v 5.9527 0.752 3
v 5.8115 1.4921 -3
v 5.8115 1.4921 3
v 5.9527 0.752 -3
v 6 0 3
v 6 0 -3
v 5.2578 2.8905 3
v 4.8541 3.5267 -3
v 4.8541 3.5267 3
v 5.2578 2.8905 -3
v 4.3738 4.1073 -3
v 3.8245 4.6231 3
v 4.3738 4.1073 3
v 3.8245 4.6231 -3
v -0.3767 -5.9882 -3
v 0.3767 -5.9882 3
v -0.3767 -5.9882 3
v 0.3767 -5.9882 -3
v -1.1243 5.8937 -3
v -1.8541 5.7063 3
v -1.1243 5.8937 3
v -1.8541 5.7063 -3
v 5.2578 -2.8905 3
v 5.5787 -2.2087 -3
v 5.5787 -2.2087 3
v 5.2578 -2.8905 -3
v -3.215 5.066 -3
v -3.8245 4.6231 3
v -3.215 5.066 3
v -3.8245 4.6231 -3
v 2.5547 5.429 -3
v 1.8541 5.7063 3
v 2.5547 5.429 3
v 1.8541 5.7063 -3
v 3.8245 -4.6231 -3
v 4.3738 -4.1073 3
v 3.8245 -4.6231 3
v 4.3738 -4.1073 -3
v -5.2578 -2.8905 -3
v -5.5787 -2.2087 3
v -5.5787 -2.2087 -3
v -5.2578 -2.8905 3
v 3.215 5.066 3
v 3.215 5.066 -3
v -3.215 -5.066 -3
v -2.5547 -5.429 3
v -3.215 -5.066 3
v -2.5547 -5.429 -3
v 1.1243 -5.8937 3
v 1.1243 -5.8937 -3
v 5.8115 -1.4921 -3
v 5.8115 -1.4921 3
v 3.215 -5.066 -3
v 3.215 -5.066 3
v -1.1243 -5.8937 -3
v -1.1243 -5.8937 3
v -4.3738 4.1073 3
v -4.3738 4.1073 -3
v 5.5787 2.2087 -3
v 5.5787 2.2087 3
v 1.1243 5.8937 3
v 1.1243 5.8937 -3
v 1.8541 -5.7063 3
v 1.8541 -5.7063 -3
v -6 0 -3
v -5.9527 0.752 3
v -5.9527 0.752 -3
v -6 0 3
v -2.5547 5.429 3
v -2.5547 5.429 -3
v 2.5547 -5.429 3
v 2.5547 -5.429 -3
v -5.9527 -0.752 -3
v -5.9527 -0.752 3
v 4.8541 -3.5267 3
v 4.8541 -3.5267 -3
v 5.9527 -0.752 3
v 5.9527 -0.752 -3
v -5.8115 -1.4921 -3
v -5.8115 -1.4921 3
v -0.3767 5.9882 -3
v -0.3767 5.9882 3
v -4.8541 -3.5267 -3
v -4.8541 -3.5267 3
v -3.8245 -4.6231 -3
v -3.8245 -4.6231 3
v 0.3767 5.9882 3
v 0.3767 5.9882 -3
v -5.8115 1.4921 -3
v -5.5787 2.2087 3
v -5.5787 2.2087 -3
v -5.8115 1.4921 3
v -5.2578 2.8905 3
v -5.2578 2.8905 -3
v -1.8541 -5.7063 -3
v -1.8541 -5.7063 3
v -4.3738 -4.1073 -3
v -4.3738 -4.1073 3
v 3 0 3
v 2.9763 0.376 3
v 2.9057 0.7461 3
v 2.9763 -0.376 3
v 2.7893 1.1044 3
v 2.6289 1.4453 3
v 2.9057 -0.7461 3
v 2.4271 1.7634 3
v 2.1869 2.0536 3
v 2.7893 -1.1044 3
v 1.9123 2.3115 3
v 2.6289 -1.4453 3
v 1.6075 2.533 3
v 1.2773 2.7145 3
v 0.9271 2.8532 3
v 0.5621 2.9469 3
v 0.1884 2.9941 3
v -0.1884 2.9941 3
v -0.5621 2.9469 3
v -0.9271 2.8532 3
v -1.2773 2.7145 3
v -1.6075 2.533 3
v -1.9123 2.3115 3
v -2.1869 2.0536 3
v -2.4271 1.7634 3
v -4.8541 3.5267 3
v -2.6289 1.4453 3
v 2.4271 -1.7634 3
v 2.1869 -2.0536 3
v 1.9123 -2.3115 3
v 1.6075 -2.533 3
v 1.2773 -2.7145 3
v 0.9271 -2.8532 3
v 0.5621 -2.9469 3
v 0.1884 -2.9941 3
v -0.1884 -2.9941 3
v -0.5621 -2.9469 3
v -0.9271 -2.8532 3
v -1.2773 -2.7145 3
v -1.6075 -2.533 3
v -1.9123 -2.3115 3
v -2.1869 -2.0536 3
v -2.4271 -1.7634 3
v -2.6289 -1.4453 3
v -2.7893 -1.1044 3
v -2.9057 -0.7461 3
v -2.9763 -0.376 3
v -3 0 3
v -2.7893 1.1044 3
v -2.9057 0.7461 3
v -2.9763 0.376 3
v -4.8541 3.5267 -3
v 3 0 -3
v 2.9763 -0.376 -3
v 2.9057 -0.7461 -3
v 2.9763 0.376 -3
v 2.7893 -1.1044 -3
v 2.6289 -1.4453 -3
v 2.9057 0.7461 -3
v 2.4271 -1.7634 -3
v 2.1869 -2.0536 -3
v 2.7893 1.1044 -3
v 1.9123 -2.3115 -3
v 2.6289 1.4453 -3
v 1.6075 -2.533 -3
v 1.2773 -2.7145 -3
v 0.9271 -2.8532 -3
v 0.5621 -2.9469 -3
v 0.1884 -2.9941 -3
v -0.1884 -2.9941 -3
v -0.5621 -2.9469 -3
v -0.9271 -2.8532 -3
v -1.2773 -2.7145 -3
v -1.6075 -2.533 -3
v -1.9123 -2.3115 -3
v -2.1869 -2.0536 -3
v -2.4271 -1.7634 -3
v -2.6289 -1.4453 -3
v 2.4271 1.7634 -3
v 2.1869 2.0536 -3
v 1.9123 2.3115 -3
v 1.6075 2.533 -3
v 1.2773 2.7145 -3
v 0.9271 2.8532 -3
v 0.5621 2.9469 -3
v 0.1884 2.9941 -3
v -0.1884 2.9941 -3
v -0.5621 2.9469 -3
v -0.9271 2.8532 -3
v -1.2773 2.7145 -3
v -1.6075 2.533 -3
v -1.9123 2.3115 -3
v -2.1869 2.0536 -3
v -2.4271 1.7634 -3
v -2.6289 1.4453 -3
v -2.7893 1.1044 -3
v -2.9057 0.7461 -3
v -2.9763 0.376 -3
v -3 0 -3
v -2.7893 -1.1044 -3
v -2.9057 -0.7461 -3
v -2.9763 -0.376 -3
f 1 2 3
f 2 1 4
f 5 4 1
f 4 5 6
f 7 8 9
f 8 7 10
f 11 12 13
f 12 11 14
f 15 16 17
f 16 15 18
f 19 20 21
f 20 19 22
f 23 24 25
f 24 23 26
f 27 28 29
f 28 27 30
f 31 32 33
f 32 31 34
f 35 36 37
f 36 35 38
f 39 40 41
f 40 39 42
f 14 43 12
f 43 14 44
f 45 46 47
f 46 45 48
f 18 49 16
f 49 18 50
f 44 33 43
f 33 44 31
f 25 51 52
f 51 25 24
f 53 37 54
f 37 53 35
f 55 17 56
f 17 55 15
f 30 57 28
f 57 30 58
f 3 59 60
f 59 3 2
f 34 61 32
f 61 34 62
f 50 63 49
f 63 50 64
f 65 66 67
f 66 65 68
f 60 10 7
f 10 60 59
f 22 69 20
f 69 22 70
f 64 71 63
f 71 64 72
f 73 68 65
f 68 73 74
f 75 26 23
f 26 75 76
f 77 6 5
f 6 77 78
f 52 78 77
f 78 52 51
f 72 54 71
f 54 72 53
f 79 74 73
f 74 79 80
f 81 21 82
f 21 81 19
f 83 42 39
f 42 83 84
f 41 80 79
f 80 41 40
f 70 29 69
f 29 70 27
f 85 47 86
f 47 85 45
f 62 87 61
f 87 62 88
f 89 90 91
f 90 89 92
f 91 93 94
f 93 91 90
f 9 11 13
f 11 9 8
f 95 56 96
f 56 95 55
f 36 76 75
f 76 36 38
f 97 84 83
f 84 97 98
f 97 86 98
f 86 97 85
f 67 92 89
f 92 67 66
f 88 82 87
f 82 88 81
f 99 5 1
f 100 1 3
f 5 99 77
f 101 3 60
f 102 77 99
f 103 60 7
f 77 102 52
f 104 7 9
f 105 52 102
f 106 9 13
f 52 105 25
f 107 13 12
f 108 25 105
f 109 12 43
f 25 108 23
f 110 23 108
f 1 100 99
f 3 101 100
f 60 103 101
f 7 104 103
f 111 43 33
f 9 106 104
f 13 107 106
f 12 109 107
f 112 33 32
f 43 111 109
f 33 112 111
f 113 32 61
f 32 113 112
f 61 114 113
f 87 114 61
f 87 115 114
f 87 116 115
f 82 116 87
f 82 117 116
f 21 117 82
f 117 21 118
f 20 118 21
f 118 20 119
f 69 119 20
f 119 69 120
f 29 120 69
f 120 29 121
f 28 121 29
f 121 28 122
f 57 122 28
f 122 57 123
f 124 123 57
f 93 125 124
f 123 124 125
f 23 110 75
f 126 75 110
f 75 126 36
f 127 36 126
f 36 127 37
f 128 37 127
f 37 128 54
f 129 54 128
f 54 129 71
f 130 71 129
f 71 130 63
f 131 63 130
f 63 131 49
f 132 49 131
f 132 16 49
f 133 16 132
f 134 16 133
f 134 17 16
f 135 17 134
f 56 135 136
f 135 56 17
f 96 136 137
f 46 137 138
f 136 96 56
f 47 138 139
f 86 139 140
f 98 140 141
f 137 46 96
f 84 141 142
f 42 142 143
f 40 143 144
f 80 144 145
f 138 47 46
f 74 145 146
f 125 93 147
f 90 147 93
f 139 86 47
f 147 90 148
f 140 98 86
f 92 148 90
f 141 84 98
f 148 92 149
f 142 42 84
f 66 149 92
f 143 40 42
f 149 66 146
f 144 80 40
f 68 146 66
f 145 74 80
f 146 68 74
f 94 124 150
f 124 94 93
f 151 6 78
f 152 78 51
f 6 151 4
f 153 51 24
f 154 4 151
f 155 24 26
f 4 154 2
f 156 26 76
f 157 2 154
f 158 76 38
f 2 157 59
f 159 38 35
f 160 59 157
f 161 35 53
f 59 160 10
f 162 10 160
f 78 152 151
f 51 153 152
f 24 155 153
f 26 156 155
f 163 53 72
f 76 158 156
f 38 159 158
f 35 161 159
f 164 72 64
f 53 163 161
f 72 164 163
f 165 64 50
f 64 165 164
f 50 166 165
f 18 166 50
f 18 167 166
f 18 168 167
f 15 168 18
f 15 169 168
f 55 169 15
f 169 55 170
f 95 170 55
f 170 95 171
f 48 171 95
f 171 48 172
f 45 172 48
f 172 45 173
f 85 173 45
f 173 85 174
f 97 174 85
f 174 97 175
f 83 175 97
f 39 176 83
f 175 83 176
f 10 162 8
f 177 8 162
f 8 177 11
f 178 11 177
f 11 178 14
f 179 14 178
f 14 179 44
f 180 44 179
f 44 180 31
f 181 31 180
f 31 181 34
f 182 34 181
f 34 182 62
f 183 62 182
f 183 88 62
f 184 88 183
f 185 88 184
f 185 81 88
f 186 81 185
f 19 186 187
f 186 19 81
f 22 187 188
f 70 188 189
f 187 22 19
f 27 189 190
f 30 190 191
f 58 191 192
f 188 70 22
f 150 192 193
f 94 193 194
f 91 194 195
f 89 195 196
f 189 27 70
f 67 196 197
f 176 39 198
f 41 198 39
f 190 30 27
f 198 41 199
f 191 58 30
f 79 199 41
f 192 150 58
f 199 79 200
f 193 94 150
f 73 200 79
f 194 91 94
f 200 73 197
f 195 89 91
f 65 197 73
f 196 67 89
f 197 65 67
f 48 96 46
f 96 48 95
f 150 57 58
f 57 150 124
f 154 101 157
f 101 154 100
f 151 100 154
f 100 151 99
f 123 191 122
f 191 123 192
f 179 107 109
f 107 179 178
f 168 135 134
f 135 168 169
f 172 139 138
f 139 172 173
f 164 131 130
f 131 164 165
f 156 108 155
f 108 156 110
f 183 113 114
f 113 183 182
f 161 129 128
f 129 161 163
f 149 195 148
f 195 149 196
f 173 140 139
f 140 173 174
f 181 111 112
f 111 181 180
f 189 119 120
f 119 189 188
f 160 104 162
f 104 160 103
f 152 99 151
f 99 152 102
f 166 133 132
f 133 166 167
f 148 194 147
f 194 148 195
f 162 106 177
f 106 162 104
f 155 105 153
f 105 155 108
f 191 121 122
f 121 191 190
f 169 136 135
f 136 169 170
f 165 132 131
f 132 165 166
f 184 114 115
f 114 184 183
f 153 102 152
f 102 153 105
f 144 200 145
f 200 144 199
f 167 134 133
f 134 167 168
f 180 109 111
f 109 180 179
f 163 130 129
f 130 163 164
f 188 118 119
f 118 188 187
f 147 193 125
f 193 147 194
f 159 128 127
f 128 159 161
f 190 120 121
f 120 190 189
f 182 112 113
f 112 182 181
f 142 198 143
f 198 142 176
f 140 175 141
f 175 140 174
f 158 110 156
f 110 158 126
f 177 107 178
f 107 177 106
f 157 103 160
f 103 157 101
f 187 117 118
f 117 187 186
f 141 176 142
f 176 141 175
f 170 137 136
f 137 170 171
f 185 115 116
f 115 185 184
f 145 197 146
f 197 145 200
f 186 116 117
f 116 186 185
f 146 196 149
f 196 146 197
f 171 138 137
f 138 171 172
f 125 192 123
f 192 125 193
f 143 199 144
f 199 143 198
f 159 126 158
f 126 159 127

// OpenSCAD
$fn = 50;


difference() {
	union() {
		translate(v = [0, 0, -3.0000000000]) {
			cylinder(h = 6, r = 6.0000000000);
		}
	}
	union() {
		translate(v = [0, 0, -100.0000000000]) {
			cylinder(h = 200, r = 3.0000000000);
		}
	}
}
